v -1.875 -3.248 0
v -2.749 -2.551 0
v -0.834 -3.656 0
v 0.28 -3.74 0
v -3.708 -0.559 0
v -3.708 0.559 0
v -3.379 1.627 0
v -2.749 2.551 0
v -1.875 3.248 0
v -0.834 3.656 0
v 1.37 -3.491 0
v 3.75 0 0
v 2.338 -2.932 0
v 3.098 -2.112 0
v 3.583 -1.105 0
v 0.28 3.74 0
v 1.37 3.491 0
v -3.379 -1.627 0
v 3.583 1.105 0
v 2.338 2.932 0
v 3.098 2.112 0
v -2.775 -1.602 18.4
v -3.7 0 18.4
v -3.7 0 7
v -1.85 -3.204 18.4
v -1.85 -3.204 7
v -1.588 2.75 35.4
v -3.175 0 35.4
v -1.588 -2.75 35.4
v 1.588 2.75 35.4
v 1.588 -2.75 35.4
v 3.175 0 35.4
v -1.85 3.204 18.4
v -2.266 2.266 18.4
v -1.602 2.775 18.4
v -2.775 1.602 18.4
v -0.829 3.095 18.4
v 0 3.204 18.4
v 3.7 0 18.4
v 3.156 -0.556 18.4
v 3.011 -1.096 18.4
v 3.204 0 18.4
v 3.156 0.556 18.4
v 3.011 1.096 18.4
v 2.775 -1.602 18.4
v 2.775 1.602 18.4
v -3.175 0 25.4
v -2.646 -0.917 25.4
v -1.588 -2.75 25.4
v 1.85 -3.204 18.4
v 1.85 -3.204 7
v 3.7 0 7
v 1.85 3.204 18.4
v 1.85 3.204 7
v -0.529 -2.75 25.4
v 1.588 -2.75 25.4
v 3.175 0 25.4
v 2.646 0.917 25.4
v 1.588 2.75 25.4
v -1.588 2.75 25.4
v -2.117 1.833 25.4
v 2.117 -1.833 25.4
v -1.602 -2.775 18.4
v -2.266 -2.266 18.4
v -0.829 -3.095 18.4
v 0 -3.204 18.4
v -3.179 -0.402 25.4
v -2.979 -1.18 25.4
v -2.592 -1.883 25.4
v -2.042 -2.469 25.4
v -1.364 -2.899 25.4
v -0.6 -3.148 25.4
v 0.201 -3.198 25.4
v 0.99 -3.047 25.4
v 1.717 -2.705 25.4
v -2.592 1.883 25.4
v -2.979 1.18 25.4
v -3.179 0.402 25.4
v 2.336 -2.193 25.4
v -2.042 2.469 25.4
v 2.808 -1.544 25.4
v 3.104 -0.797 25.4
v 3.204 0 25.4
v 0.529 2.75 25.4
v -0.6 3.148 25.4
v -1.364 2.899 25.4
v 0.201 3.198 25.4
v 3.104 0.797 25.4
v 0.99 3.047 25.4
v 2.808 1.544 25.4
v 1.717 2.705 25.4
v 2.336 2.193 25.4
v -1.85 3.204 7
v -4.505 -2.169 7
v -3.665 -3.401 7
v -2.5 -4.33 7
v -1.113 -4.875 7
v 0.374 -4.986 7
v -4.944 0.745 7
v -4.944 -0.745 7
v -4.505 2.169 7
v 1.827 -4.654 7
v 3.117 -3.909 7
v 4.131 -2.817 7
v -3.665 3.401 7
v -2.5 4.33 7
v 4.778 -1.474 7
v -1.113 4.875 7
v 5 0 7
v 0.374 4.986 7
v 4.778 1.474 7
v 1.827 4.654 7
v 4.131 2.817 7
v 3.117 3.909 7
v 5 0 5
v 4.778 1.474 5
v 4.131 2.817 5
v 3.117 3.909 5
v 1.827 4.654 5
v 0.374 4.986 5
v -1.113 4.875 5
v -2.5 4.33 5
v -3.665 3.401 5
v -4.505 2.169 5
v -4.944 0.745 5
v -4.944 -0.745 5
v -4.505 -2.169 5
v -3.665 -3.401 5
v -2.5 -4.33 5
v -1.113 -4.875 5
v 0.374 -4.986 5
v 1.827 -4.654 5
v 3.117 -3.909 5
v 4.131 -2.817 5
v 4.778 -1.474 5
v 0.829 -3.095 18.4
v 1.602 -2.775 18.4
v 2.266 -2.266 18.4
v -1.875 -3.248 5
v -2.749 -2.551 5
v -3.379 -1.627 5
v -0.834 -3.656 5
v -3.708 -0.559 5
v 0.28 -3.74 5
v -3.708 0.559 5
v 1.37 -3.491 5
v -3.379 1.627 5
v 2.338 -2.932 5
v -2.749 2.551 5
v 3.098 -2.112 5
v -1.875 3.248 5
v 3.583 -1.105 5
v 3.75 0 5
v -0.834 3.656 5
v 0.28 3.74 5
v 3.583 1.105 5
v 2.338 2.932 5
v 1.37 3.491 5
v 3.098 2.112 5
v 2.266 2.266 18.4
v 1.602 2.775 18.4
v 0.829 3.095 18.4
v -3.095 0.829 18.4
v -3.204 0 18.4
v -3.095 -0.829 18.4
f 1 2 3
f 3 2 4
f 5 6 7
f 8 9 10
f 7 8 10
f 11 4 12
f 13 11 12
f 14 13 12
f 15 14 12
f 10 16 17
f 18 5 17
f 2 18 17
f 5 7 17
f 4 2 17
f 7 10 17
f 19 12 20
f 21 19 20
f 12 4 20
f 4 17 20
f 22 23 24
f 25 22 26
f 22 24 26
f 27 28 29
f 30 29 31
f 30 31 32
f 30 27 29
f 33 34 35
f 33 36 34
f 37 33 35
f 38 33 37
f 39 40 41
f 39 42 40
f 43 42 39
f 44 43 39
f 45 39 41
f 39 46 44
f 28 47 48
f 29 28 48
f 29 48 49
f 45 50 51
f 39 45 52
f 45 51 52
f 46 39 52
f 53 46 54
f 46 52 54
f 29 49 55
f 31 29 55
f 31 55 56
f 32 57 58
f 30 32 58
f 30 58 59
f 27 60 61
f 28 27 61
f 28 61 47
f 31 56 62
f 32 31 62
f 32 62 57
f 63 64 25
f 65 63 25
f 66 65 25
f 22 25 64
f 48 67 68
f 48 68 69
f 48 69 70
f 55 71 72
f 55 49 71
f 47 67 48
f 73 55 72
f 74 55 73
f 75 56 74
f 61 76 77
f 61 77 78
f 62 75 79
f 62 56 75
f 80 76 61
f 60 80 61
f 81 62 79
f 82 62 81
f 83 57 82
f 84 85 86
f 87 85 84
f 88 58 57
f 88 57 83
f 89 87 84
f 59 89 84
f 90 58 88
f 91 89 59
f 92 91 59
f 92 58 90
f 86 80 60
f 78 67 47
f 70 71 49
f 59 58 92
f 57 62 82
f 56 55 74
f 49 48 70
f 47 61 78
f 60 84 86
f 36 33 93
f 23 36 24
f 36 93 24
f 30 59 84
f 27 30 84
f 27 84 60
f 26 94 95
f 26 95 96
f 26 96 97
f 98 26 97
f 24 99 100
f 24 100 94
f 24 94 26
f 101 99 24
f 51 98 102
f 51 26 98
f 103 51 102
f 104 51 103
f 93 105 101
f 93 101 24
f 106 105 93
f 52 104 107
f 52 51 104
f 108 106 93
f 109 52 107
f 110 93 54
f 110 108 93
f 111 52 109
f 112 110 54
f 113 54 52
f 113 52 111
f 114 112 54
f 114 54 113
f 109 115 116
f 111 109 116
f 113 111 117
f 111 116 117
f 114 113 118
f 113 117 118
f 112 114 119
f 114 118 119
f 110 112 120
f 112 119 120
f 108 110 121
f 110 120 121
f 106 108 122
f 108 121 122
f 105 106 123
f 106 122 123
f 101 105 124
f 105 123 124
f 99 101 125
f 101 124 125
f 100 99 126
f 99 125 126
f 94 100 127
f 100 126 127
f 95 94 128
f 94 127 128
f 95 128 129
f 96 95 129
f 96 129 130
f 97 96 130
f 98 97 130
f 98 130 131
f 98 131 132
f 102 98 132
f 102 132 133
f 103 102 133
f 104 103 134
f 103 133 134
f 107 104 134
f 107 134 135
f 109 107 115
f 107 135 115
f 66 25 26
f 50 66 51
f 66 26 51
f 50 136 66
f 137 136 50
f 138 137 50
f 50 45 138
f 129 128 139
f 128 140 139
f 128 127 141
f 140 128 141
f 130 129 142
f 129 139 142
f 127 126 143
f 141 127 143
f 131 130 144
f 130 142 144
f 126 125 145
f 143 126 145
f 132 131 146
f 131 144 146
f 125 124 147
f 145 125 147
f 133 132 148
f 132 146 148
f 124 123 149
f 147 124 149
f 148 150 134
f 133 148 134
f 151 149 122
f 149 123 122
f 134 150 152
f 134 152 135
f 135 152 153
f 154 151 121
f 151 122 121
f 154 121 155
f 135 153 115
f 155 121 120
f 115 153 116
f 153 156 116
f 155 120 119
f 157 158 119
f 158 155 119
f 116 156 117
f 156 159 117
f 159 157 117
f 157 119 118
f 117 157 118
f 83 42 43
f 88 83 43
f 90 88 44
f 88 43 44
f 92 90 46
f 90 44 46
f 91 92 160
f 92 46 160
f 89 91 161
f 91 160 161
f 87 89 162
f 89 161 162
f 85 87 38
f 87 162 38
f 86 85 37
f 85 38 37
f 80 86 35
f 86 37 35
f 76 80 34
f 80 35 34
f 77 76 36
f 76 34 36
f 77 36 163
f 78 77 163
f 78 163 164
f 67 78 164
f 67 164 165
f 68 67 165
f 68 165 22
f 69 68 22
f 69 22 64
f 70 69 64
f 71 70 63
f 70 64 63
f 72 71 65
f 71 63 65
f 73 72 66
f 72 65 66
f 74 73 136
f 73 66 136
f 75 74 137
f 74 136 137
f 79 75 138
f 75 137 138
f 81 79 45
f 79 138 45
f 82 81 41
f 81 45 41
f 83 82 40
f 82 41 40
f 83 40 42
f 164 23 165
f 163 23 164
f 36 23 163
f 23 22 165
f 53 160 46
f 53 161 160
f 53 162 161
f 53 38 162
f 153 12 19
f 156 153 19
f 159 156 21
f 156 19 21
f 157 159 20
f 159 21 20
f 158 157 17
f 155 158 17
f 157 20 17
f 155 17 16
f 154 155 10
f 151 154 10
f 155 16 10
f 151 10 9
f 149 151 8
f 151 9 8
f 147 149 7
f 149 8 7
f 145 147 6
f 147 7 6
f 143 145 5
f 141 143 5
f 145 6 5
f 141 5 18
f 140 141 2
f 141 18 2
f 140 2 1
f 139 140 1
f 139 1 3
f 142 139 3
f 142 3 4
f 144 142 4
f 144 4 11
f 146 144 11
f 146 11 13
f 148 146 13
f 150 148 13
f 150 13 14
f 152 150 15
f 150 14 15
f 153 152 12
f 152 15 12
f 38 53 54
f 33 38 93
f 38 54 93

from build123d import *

# Parameters (mm, degrees)
SKETCH1_R           = 3.75
BOSS_EXTRUDE1_DEPTH = 5
SKETCH2_R           = 5
BOSS_EXTRUDE2_DEPTH = 2
BOSS_EXTRUDE3_DEPTH = 11.4
SKETCH4_R           = 3.204293994
BOSS_EXTRUDE4_DEPTH = 7
BOSS_EXTRUDE5_DEPTH = 10


with BuildPart() as part:
    # Sketch1 → Boss-Extrude1 (new body)
    with BuildSketch(Plane.XY):
        Circle(SKETCH1_R)
    extrude(amount=BOSS_EXTRUDE1_DEPTH)

    # Sketch2 → Boss-Extrude2 (add)
    with BuildSketch(Plane.XY.offset(5)):
        Circle(SKETCH2_R)
    extrude(amount=BOSS_EXTRUDE2_DEPTH)

    # Sketch3 → Boss-Extrude3 (add)
    with BuildSketch(Plane.XY.offset(7)):
        Polygon((3.7, 0), (1.85, 3.204293994), (-1.85, 3.204293994), (-3.7, 0), (-1.85, -3.204293994), (1.85, -3.204293994), align=None)
    extrude(amount=BOSS_EXTRUDE3_DEPTH)

    # Sketch4 → Boss-Extrude4 (add)
    with BuildSketch(Plane.XY.offset(18.4)):
        Circle(SKETCH4_R)
    extrude(amount=BOSS_EXTRUDE4_DEPTH)

    # Sketch5 → Boss-Extrude5 (add)
    with BuildSketch(Plane.XY.offset(25.4)):
        Polygon((3.175, 0), (1.5875, 2.749630657), (-1.5875, 2.749630657), (-3.175, 0), (-1.5875, -2.749630657), (1.5875, -2.749630657), align=None)
    extrude(amount=BOSS_EXTRUDE5_DEPTH)


solid = part.part
